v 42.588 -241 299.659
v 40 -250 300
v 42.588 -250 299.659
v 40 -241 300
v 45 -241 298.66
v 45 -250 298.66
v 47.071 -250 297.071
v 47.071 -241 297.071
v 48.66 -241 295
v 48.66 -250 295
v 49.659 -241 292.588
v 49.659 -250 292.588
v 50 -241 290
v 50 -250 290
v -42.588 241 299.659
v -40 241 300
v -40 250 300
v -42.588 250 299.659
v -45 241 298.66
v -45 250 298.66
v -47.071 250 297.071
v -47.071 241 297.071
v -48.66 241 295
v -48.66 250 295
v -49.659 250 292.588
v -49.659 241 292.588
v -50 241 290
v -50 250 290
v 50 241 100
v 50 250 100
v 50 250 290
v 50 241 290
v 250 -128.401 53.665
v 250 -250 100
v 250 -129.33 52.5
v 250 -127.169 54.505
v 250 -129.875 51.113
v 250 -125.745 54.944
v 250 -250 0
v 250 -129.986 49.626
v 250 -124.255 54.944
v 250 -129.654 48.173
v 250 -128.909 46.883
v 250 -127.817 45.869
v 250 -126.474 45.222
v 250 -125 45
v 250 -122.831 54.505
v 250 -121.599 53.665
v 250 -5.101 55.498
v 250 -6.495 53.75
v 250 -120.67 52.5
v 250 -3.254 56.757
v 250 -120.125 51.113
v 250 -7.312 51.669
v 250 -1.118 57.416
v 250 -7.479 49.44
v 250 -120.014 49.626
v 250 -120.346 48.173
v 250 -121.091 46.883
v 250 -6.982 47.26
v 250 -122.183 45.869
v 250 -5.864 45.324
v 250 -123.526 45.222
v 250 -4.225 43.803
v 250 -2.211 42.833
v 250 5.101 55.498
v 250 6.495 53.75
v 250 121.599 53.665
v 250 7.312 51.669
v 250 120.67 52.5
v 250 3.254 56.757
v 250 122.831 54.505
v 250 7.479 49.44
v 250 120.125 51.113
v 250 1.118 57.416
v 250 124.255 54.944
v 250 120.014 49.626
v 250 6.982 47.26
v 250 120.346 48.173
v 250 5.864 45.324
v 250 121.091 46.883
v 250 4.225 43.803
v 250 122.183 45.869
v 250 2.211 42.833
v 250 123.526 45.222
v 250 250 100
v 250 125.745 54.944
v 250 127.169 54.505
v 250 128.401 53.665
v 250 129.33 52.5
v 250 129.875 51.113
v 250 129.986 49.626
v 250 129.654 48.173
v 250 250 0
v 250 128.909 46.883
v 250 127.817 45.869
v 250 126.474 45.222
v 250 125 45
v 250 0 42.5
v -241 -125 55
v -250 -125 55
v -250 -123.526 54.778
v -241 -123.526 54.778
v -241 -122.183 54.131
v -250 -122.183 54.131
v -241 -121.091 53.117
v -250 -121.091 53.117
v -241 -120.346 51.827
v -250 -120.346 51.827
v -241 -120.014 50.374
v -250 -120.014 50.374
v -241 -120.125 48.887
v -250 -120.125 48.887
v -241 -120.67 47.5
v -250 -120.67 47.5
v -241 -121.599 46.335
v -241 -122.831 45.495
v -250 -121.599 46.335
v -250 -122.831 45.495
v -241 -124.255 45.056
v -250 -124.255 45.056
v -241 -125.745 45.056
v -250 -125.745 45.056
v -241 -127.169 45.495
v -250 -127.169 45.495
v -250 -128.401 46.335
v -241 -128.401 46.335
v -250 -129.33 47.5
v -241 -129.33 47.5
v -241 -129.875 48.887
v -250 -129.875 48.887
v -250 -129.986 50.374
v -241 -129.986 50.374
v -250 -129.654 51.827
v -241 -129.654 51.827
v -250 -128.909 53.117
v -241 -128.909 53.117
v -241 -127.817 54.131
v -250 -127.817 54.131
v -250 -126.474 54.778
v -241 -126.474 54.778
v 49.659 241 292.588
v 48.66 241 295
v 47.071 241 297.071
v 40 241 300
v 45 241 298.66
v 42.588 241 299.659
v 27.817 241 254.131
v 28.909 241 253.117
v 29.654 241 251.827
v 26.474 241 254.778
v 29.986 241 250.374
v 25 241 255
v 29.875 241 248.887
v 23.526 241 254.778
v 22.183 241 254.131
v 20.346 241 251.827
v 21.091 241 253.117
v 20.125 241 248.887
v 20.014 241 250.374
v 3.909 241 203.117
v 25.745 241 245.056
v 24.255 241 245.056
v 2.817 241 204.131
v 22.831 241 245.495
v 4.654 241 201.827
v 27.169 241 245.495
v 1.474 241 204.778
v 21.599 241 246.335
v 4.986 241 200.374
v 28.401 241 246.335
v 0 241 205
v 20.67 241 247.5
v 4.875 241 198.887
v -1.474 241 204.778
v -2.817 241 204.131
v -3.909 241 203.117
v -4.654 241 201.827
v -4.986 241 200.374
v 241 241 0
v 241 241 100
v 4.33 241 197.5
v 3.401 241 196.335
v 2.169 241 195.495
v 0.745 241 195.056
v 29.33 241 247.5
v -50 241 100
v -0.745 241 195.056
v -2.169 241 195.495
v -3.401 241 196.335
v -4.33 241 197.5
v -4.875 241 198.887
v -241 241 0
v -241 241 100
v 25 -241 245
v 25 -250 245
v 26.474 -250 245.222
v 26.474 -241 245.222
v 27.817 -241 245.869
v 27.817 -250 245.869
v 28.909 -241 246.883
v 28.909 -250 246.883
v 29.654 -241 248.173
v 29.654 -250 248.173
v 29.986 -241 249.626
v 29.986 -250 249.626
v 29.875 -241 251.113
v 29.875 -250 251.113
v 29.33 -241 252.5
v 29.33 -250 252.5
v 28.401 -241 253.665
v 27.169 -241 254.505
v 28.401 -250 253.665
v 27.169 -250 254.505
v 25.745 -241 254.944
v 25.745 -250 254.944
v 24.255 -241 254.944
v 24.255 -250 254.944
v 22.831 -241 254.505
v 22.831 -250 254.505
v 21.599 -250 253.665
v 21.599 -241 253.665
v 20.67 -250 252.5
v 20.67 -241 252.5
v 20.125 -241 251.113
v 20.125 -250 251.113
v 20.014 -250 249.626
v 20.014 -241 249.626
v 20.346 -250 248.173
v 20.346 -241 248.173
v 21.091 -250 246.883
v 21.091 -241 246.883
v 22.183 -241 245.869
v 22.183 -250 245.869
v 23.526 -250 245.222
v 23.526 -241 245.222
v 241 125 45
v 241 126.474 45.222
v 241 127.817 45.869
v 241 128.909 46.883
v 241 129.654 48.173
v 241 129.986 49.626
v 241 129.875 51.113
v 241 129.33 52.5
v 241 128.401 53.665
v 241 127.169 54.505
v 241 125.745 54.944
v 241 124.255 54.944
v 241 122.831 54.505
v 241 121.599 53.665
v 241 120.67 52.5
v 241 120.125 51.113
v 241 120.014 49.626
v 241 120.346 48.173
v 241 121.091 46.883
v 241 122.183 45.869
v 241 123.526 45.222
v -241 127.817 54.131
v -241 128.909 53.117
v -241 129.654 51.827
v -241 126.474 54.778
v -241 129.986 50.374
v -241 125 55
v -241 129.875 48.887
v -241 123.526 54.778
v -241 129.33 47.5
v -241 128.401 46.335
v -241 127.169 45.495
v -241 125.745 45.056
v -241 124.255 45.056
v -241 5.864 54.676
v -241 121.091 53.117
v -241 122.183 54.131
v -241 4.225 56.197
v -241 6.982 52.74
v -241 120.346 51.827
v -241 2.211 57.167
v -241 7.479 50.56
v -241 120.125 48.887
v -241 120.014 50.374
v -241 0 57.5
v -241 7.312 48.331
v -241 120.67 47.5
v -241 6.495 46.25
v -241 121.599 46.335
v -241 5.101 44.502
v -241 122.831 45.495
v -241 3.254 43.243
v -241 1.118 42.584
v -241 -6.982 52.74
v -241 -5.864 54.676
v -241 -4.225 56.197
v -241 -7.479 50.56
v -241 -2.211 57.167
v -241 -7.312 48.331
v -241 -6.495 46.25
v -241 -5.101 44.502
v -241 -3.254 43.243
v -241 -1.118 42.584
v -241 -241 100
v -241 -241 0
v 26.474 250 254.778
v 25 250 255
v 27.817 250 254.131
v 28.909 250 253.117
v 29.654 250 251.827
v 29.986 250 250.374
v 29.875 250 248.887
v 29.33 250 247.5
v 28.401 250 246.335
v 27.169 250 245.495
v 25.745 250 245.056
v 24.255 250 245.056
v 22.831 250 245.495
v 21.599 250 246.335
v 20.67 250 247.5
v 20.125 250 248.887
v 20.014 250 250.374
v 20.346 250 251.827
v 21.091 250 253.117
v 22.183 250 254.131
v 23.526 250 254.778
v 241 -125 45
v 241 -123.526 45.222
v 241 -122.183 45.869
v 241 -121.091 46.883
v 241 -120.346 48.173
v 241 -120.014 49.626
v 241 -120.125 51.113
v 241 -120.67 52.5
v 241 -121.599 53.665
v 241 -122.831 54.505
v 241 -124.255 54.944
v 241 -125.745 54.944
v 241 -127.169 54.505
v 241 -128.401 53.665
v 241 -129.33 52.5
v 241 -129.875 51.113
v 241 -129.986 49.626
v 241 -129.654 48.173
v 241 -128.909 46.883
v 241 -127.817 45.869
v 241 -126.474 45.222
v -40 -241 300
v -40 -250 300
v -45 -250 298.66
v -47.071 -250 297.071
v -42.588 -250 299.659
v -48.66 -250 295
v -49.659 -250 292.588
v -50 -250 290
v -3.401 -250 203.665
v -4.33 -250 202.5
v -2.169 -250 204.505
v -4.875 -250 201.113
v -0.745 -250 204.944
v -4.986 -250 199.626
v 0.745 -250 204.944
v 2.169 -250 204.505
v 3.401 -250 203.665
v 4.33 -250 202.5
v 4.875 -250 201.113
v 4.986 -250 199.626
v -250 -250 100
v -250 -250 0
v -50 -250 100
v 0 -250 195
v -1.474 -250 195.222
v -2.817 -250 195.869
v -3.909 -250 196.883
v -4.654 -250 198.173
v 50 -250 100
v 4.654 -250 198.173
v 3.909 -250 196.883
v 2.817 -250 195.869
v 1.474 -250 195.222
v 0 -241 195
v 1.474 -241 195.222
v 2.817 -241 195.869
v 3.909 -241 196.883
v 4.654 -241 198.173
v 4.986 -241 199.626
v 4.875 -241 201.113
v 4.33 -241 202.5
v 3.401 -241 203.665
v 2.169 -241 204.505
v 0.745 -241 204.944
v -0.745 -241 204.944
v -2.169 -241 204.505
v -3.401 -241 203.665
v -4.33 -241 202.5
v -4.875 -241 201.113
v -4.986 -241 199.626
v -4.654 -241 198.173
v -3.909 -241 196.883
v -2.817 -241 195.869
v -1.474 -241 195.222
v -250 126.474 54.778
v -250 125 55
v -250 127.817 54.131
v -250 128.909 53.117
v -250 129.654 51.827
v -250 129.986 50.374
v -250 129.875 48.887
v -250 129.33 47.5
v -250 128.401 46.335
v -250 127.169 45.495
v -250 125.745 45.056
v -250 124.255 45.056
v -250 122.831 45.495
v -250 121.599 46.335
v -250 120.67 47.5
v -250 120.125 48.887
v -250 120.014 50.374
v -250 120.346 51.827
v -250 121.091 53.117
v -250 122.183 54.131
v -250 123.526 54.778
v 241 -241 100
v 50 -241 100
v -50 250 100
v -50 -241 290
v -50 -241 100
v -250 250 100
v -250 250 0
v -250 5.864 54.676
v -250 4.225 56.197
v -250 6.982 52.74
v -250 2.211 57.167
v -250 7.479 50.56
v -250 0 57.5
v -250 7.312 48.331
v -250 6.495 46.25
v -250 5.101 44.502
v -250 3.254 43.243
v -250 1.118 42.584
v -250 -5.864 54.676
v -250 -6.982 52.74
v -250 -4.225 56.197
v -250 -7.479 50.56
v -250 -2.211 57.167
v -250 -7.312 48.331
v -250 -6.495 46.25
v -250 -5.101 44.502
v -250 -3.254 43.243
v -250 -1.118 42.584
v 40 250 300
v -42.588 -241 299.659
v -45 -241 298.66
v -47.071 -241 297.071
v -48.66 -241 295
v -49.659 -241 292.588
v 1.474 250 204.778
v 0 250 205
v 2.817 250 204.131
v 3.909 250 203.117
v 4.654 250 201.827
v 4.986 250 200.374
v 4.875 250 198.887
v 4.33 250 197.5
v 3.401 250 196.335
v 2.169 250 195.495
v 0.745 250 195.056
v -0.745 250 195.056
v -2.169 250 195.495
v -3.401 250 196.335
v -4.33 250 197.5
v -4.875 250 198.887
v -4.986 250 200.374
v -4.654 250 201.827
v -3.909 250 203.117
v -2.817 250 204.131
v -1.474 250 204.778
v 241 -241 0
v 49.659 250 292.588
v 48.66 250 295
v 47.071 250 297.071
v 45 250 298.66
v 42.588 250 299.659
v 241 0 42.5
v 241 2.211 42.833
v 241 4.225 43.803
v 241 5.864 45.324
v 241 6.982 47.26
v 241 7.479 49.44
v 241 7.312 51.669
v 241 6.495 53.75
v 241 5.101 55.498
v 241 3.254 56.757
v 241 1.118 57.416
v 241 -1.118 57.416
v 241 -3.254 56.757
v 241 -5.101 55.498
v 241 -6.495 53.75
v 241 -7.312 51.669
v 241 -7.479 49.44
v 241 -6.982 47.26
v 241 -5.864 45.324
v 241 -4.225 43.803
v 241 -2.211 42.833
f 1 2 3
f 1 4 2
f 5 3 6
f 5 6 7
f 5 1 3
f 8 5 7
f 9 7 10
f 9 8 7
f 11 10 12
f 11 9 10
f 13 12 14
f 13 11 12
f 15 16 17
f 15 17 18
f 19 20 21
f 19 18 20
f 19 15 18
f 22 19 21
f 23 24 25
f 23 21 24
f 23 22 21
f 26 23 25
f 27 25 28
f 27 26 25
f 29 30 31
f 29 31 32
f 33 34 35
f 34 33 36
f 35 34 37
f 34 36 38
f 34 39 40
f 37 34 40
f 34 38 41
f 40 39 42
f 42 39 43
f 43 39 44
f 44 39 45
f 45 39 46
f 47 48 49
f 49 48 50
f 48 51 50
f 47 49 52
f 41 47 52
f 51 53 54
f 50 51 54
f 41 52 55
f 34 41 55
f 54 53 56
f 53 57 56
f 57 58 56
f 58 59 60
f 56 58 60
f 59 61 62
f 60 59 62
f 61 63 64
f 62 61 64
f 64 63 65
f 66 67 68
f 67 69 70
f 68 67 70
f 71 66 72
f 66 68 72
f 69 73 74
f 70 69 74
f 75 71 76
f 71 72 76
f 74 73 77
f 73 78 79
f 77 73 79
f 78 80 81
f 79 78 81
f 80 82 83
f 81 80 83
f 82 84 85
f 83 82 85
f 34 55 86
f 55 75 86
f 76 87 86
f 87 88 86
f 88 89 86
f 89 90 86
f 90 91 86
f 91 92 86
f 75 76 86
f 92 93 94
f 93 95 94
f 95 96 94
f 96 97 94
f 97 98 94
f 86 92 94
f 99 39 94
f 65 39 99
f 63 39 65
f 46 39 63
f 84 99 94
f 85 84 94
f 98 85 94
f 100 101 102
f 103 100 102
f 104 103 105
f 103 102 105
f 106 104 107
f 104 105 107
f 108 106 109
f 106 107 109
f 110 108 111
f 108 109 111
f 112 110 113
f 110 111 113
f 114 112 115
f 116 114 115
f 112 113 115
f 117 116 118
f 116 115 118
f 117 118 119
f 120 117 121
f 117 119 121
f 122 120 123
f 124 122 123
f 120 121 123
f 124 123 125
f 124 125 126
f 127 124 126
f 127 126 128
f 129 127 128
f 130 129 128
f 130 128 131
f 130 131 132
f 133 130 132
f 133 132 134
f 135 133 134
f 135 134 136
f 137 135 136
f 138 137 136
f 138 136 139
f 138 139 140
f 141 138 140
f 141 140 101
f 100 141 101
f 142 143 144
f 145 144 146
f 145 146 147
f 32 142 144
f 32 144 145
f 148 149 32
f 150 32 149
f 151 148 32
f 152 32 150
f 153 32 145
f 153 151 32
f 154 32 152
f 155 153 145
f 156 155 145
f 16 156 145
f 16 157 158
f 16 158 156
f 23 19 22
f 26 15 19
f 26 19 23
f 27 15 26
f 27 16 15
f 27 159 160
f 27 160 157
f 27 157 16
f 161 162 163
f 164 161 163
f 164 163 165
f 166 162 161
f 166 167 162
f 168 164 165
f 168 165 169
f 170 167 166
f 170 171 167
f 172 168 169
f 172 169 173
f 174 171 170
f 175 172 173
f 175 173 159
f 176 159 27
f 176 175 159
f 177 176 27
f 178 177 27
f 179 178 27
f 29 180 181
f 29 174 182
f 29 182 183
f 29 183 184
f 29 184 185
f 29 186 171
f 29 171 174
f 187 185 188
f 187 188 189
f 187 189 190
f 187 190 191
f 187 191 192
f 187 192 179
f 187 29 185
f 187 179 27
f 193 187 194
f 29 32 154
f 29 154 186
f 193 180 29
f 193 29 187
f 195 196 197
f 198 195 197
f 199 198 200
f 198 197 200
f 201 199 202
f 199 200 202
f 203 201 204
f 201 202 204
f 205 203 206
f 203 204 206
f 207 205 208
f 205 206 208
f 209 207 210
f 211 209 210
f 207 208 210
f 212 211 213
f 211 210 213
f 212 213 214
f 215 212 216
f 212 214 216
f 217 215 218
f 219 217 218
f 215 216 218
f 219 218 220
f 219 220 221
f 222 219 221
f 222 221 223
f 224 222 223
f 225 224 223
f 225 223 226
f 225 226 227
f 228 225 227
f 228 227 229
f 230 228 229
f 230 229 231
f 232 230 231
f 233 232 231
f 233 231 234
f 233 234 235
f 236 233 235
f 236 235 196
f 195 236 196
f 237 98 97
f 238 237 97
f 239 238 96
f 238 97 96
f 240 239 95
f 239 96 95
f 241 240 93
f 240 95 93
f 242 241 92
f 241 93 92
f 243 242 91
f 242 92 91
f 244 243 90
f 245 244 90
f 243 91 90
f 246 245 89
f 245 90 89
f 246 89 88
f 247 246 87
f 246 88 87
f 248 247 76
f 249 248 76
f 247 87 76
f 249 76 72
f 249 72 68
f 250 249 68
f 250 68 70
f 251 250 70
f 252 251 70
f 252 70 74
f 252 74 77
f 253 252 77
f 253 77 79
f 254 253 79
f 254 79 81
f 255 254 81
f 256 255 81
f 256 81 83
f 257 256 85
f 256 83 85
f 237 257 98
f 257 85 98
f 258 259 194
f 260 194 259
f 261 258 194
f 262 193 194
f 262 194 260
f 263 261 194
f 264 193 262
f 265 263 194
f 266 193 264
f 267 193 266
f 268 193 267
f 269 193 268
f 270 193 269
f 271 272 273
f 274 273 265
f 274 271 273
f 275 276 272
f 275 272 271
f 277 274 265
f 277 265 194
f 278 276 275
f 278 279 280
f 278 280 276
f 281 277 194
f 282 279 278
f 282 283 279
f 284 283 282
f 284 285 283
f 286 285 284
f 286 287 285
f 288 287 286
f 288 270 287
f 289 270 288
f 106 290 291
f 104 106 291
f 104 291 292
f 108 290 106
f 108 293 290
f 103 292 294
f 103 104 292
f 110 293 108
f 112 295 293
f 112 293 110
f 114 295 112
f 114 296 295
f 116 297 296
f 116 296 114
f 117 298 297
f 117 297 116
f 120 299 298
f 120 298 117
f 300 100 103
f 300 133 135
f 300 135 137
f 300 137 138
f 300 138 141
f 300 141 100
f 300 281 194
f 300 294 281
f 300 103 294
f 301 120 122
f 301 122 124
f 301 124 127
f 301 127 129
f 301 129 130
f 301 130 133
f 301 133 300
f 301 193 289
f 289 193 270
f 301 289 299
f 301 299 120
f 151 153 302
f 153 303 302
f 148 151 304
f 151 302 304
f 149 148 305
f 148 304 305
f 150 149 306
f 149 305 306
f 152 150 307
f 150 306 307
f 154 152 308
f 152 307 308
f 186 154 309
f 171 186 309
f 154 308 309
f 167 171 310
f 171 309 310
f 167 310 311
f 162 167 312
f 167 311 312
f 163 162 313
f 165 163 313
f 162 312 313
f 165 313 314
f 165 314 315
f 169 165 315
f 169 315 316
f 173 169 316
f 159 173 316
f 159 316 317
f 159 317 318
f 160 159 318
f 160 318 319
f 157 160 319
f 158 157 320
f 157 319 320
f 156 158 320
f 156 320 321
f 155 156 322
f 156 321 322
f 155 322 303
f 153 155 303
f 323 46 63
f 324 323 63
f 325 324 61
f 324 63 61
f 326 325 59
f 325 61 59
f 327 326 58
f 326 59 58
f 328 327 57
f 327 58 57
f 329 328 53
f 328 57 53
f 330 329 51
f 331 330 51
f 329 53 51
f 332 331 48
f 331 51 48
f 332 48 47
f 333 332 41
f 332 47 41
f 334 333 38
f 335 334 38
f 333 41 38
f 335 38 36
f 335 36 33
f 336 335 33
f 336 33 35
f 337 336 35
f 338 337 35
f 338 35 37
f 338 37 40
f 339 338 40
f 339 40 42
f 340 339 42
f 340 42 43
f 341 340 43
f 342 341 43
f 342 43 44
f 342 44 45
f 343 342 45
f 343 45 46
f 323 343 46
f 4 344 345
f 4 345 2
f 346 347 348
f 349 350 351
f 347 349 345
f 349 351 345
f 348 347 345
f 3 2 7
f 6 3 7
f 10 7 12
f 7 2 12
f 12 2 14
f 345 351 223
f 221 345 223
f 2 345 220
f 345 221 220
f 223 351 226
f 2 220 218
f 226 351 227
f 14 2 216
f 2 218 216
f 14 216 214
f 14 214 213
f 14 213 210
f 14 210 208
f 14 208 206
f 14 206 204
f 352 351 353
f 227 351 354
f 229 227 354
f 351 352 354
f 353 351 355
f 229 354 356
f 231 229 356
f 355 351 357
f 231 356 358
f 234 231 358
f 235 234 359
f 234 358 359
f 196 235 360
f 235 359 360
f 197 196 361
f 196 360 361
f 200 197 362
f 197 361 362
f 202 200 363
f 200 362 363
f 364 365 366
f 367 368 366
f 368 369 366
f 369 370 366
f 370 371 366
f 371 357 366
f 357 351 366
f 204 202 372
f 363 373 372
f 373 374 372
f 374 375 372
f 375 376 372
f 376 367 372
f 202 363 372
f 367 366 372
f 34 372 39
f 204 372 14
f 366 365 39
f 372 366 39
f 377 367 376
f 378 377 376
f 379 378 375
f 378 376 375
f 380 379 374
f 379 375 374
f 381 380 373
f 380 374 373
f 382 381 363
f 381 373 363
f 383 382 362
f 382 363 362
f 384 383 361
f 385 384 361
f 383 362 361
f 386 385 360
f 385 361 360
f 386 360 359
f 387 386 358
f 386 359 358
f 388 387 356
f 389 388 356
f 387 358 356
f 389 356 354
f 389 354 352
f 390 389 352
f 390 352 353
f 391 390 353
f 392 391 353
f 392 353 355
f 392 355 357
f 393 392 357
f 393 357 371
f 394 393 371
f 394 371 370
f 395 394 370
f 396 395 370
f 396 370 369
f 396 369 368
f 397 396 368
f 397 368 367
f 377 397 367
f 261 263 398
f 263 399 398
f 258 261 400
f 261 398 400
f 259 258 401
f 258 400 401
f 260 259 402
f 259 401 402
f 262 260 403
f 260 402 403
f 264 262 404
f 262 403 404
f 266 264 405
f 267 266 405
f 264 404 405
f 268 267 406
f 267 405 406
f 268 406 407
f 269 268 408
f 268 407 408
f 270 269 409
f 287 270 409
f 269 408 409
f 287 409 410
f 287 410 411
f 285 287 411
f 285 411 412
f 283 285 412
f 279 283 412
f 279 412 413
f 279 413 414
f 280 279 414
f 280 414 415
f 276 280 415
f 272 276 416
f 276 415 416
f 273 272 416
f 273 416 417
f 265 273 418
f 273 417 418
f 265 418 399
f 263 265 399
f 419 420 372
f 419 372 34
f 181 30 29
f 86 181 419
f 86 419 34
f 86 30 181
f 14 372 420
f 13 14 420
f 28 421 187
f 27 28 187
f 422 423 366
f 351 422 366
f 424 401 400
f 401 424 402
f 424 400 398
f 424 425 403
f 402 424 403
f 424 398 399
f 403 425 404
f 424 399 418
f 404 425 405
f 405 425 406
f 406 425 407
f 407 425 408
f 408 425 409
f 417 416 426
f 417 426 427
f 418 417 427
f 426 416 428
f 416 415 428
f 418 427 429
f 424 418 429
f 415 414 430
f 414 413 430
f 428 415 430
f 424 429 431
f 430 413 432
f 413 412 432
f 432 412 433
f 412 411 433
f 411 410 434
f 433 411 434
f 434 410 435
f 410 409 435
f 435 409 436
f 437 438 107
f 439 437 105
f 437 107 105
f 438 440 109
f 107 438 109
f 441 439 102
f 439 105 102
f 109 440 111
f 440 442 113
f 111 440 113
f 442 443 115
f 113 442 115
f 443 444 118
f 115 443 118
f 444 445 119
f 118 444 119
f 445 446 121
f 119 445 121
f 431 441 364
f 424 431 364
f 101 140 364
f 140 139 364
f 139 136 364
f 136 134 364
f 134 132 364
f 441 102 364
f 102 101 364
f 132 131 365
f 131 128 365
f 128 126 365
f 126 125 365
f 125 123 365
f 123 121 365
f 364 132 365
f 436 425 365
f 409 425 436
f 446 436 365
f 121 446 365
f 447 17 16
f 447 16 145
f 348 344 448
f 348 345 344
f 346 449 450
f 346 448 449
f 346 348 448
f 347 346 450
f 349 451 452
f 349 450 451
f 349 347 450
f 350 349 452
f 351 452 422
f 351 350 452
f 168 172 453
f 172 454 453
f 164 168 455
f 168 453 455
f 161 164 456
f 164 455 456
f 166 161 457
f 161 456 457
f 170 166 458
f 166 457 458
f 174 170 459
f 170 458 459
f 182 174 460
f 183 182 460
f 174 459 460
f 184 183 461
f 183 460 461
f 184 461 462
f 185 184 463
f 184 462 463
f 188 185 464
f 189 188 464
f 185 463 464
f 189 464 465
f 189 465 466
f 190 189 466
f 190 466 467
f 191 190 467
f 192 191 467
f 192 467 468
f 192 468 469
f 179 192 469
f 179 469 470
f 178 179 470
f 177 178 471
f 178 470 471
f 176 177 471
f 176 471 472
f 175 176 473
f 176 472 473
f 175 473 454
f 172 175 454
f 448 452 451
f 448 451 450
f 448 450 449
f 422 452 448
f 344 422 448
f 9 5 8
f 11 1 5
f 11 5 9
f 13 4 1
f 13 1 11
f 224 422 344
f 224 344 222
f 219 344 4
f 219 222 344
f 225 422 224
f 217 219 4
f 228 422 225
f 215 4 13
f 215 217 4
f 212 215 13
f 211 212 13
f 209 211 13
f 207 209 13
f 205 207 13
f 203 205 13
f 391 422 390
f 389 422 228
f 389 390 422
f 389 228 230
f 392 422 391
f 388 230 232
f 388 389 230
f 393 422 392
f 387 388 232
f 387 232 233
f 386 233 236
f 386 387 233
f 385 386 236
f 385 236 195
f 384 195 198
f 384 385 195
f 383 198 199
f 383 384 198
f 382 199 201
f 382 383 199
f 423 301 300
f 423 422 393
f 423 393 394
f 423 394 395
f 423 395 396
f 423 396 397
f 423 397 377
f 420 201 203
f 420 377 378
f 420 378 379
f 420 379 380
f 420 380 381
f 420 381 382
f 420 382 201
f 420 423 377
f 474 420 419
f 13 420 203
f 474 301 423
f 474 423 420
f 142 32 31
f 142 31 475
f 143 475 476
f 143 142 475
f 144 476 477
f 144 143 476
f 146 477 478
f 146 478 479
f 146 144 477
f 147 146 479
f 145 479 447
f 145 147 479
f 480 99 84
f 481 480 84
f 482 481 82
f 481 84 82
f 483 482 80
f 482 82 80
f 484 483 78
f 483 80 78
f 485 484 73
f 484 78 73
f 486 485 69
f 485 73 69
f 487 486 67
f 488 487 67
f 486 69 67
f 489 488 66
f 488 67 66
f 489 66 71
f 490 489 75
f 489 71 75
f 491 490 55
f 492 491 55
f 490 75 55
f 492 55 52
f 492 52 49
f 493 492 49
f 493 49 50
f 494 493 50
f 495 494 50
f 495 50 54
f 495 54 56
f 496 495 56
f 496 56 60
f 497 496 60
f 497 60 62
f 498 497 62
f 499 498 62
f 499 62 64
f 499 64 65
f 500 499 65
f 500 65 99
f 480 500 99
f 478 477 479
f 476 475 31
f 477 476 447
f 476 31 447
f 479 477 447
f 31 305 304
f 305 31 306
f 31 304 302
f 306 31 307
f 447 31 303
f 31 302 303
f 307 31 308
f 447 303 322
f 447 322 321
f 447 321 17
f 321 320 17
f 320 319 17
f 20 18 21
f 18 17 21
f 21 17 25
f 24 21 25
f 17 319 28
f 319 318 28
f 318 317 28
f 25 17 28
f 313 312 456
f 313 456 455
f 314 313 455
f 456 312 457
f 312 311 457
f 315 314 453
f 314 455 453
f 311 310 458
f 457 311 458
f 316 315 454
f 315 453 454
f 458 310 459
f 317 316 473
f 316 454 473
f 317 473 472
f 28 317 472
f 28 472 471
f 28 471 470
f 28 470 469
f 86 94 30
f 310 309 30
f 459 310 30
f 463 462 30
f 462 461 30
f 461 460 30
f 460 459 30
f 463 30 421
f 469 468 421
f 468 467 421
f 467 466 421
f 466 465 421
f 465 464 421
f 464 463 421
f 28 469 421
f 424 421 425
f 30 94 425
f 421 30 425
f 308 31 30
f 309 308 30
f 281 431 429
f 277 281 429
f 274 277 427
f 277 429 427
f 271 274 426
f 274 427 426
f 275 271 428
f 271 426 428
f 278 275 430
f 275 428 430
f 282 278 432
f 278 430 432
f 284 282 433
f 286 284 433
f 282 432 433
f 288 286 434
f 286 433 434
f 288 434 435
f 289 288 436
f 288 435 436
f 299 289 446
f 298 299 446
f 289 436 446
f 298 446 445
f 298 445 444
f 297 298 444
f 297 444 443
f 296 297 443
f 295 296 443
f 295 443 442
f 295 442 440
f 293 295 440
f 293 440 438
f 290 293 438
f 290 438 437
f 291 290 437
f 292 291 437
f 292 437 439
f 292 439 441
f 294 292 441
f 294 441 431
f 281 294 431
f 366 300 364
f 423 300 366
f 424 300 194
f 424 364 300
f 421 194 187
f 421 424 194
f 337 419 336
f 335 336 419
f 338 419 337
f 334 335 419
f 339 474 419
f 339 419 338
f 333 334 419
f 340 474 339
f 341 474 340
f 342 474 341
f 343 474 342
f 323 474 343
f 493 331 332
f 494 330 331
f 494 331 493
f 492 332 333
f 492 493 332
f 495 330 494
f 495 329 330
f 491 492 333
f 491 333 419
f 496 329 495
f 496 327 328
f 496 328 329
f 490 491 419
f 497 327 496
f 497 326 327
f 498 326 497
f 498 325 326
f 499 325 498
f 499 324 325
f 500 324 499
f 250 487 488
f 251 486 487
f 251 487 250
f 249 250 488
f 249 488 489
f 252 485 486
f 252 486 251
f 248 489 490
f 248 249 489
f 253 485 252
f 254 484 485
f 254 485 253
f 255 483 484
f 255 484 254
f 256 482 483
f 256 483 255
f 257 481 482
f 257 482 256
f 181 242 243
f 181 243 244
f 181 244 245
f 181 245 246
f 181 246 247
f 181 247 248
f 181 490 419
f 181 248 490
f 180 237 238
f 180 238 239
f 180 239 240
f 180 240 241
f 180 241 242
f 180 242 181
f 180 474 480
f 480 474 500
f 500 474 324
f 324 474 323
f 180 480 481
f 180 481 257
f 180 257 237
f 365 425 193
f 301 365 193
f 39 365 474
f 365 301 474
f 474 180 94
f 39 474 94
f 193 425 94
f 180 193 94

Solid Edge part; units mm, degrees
sketch "Sketch1" plane through (0, 0, 0) normal (0, 0, 1) x (1, 0, 0)
  line L0 (-250, -250) -> (250, -250)
  line L1 (250, -250) -> (250, 250)
  line L2 (250, 250) -> (-250, 250)
  line L3 (-250, 250) -> (-250, -250)
  line L4 (-241, -241) -> (241, -241)
  line L5 (241, -241) -> (241, 241)
  line L6 (241, 241) -> (-241, 241)
  line L7 (-241, 241) -> (-241, -241)
  dimension "D1" = 500
  dimension "D2" = 500
  dimension "D3" = 9
  dimension "D4" = 9
extrude "Protrusion1" add sketch "Sketch1" along normal blind 100
sketch "Sketch2" plane through (0, 0, 100) normal (0, 0, 1) x (1, 0, 0)
  line L0 (0, 250) -> (-50, 250)
  line L1 (-50, 250) -> (-50, 241)
  line L2 (-50, 241) -> (0, 241)
  line L3 (50, 241) -> (0, 241)
  line L4 (50, 250) -> (50, 241)
  line L5 (0, 250) -> (50, 250)
  line L6 (-50, -250) -> (50, -250)
  line L7 (50, -250) -> (50, -241)
  line L8 (50, -241) -> (-50, -241)
  line L9 (-50, -241) -> (-50, -250)
  dimension "D1" = 100
  dimension "D2" = 100
extrude "ExtrudedProtrusion_2" add sketch "Sketch2" along normal blind 200
hole "Hole_1" at (250, -125, 50) direction (-1, 0, 0) diameter 10 end up to next
hole "Hole_2" at (250, 125, 50) direction (-1, 0, 0) diameter 10 end up to next
hole "Hole_Screw1" at (250, 0, 50) direction (-1, 0, 0) diameter 15 end up to next
hole "Hole_4" at (-250, 125, 50) direction (1, 0, 0) diameter 10 end up to next
hole "Hole1" at (-250, -125, 50) direction (1, 0, 0) diameter 10 end up to next
hole "Hole_Screw2" at (-250, 0, 50) direction (1, 0, 0) diameter 15 end up to next
hole "Hole_7" at (25, -250, 250) direction (0, 1, 0) diameter 10 end up to next
hole "Hole2" at (0, -250, 200) direction (0, 1, 0) diameter 10 end up to next
hole "Hole_9" at (25, 250, 250) direction (0, -1, 0) diameter 10 end up to next
hole "Hole3" at (0, 250, 200) direction (0, -1, 0) diameter 10 end up to next
fillet "Round1" radius 10 4 edges at (-50, 245.5, 300) (50, 245.5, 300) (-50, -245.5, 300) (50, -245.5, 300)
